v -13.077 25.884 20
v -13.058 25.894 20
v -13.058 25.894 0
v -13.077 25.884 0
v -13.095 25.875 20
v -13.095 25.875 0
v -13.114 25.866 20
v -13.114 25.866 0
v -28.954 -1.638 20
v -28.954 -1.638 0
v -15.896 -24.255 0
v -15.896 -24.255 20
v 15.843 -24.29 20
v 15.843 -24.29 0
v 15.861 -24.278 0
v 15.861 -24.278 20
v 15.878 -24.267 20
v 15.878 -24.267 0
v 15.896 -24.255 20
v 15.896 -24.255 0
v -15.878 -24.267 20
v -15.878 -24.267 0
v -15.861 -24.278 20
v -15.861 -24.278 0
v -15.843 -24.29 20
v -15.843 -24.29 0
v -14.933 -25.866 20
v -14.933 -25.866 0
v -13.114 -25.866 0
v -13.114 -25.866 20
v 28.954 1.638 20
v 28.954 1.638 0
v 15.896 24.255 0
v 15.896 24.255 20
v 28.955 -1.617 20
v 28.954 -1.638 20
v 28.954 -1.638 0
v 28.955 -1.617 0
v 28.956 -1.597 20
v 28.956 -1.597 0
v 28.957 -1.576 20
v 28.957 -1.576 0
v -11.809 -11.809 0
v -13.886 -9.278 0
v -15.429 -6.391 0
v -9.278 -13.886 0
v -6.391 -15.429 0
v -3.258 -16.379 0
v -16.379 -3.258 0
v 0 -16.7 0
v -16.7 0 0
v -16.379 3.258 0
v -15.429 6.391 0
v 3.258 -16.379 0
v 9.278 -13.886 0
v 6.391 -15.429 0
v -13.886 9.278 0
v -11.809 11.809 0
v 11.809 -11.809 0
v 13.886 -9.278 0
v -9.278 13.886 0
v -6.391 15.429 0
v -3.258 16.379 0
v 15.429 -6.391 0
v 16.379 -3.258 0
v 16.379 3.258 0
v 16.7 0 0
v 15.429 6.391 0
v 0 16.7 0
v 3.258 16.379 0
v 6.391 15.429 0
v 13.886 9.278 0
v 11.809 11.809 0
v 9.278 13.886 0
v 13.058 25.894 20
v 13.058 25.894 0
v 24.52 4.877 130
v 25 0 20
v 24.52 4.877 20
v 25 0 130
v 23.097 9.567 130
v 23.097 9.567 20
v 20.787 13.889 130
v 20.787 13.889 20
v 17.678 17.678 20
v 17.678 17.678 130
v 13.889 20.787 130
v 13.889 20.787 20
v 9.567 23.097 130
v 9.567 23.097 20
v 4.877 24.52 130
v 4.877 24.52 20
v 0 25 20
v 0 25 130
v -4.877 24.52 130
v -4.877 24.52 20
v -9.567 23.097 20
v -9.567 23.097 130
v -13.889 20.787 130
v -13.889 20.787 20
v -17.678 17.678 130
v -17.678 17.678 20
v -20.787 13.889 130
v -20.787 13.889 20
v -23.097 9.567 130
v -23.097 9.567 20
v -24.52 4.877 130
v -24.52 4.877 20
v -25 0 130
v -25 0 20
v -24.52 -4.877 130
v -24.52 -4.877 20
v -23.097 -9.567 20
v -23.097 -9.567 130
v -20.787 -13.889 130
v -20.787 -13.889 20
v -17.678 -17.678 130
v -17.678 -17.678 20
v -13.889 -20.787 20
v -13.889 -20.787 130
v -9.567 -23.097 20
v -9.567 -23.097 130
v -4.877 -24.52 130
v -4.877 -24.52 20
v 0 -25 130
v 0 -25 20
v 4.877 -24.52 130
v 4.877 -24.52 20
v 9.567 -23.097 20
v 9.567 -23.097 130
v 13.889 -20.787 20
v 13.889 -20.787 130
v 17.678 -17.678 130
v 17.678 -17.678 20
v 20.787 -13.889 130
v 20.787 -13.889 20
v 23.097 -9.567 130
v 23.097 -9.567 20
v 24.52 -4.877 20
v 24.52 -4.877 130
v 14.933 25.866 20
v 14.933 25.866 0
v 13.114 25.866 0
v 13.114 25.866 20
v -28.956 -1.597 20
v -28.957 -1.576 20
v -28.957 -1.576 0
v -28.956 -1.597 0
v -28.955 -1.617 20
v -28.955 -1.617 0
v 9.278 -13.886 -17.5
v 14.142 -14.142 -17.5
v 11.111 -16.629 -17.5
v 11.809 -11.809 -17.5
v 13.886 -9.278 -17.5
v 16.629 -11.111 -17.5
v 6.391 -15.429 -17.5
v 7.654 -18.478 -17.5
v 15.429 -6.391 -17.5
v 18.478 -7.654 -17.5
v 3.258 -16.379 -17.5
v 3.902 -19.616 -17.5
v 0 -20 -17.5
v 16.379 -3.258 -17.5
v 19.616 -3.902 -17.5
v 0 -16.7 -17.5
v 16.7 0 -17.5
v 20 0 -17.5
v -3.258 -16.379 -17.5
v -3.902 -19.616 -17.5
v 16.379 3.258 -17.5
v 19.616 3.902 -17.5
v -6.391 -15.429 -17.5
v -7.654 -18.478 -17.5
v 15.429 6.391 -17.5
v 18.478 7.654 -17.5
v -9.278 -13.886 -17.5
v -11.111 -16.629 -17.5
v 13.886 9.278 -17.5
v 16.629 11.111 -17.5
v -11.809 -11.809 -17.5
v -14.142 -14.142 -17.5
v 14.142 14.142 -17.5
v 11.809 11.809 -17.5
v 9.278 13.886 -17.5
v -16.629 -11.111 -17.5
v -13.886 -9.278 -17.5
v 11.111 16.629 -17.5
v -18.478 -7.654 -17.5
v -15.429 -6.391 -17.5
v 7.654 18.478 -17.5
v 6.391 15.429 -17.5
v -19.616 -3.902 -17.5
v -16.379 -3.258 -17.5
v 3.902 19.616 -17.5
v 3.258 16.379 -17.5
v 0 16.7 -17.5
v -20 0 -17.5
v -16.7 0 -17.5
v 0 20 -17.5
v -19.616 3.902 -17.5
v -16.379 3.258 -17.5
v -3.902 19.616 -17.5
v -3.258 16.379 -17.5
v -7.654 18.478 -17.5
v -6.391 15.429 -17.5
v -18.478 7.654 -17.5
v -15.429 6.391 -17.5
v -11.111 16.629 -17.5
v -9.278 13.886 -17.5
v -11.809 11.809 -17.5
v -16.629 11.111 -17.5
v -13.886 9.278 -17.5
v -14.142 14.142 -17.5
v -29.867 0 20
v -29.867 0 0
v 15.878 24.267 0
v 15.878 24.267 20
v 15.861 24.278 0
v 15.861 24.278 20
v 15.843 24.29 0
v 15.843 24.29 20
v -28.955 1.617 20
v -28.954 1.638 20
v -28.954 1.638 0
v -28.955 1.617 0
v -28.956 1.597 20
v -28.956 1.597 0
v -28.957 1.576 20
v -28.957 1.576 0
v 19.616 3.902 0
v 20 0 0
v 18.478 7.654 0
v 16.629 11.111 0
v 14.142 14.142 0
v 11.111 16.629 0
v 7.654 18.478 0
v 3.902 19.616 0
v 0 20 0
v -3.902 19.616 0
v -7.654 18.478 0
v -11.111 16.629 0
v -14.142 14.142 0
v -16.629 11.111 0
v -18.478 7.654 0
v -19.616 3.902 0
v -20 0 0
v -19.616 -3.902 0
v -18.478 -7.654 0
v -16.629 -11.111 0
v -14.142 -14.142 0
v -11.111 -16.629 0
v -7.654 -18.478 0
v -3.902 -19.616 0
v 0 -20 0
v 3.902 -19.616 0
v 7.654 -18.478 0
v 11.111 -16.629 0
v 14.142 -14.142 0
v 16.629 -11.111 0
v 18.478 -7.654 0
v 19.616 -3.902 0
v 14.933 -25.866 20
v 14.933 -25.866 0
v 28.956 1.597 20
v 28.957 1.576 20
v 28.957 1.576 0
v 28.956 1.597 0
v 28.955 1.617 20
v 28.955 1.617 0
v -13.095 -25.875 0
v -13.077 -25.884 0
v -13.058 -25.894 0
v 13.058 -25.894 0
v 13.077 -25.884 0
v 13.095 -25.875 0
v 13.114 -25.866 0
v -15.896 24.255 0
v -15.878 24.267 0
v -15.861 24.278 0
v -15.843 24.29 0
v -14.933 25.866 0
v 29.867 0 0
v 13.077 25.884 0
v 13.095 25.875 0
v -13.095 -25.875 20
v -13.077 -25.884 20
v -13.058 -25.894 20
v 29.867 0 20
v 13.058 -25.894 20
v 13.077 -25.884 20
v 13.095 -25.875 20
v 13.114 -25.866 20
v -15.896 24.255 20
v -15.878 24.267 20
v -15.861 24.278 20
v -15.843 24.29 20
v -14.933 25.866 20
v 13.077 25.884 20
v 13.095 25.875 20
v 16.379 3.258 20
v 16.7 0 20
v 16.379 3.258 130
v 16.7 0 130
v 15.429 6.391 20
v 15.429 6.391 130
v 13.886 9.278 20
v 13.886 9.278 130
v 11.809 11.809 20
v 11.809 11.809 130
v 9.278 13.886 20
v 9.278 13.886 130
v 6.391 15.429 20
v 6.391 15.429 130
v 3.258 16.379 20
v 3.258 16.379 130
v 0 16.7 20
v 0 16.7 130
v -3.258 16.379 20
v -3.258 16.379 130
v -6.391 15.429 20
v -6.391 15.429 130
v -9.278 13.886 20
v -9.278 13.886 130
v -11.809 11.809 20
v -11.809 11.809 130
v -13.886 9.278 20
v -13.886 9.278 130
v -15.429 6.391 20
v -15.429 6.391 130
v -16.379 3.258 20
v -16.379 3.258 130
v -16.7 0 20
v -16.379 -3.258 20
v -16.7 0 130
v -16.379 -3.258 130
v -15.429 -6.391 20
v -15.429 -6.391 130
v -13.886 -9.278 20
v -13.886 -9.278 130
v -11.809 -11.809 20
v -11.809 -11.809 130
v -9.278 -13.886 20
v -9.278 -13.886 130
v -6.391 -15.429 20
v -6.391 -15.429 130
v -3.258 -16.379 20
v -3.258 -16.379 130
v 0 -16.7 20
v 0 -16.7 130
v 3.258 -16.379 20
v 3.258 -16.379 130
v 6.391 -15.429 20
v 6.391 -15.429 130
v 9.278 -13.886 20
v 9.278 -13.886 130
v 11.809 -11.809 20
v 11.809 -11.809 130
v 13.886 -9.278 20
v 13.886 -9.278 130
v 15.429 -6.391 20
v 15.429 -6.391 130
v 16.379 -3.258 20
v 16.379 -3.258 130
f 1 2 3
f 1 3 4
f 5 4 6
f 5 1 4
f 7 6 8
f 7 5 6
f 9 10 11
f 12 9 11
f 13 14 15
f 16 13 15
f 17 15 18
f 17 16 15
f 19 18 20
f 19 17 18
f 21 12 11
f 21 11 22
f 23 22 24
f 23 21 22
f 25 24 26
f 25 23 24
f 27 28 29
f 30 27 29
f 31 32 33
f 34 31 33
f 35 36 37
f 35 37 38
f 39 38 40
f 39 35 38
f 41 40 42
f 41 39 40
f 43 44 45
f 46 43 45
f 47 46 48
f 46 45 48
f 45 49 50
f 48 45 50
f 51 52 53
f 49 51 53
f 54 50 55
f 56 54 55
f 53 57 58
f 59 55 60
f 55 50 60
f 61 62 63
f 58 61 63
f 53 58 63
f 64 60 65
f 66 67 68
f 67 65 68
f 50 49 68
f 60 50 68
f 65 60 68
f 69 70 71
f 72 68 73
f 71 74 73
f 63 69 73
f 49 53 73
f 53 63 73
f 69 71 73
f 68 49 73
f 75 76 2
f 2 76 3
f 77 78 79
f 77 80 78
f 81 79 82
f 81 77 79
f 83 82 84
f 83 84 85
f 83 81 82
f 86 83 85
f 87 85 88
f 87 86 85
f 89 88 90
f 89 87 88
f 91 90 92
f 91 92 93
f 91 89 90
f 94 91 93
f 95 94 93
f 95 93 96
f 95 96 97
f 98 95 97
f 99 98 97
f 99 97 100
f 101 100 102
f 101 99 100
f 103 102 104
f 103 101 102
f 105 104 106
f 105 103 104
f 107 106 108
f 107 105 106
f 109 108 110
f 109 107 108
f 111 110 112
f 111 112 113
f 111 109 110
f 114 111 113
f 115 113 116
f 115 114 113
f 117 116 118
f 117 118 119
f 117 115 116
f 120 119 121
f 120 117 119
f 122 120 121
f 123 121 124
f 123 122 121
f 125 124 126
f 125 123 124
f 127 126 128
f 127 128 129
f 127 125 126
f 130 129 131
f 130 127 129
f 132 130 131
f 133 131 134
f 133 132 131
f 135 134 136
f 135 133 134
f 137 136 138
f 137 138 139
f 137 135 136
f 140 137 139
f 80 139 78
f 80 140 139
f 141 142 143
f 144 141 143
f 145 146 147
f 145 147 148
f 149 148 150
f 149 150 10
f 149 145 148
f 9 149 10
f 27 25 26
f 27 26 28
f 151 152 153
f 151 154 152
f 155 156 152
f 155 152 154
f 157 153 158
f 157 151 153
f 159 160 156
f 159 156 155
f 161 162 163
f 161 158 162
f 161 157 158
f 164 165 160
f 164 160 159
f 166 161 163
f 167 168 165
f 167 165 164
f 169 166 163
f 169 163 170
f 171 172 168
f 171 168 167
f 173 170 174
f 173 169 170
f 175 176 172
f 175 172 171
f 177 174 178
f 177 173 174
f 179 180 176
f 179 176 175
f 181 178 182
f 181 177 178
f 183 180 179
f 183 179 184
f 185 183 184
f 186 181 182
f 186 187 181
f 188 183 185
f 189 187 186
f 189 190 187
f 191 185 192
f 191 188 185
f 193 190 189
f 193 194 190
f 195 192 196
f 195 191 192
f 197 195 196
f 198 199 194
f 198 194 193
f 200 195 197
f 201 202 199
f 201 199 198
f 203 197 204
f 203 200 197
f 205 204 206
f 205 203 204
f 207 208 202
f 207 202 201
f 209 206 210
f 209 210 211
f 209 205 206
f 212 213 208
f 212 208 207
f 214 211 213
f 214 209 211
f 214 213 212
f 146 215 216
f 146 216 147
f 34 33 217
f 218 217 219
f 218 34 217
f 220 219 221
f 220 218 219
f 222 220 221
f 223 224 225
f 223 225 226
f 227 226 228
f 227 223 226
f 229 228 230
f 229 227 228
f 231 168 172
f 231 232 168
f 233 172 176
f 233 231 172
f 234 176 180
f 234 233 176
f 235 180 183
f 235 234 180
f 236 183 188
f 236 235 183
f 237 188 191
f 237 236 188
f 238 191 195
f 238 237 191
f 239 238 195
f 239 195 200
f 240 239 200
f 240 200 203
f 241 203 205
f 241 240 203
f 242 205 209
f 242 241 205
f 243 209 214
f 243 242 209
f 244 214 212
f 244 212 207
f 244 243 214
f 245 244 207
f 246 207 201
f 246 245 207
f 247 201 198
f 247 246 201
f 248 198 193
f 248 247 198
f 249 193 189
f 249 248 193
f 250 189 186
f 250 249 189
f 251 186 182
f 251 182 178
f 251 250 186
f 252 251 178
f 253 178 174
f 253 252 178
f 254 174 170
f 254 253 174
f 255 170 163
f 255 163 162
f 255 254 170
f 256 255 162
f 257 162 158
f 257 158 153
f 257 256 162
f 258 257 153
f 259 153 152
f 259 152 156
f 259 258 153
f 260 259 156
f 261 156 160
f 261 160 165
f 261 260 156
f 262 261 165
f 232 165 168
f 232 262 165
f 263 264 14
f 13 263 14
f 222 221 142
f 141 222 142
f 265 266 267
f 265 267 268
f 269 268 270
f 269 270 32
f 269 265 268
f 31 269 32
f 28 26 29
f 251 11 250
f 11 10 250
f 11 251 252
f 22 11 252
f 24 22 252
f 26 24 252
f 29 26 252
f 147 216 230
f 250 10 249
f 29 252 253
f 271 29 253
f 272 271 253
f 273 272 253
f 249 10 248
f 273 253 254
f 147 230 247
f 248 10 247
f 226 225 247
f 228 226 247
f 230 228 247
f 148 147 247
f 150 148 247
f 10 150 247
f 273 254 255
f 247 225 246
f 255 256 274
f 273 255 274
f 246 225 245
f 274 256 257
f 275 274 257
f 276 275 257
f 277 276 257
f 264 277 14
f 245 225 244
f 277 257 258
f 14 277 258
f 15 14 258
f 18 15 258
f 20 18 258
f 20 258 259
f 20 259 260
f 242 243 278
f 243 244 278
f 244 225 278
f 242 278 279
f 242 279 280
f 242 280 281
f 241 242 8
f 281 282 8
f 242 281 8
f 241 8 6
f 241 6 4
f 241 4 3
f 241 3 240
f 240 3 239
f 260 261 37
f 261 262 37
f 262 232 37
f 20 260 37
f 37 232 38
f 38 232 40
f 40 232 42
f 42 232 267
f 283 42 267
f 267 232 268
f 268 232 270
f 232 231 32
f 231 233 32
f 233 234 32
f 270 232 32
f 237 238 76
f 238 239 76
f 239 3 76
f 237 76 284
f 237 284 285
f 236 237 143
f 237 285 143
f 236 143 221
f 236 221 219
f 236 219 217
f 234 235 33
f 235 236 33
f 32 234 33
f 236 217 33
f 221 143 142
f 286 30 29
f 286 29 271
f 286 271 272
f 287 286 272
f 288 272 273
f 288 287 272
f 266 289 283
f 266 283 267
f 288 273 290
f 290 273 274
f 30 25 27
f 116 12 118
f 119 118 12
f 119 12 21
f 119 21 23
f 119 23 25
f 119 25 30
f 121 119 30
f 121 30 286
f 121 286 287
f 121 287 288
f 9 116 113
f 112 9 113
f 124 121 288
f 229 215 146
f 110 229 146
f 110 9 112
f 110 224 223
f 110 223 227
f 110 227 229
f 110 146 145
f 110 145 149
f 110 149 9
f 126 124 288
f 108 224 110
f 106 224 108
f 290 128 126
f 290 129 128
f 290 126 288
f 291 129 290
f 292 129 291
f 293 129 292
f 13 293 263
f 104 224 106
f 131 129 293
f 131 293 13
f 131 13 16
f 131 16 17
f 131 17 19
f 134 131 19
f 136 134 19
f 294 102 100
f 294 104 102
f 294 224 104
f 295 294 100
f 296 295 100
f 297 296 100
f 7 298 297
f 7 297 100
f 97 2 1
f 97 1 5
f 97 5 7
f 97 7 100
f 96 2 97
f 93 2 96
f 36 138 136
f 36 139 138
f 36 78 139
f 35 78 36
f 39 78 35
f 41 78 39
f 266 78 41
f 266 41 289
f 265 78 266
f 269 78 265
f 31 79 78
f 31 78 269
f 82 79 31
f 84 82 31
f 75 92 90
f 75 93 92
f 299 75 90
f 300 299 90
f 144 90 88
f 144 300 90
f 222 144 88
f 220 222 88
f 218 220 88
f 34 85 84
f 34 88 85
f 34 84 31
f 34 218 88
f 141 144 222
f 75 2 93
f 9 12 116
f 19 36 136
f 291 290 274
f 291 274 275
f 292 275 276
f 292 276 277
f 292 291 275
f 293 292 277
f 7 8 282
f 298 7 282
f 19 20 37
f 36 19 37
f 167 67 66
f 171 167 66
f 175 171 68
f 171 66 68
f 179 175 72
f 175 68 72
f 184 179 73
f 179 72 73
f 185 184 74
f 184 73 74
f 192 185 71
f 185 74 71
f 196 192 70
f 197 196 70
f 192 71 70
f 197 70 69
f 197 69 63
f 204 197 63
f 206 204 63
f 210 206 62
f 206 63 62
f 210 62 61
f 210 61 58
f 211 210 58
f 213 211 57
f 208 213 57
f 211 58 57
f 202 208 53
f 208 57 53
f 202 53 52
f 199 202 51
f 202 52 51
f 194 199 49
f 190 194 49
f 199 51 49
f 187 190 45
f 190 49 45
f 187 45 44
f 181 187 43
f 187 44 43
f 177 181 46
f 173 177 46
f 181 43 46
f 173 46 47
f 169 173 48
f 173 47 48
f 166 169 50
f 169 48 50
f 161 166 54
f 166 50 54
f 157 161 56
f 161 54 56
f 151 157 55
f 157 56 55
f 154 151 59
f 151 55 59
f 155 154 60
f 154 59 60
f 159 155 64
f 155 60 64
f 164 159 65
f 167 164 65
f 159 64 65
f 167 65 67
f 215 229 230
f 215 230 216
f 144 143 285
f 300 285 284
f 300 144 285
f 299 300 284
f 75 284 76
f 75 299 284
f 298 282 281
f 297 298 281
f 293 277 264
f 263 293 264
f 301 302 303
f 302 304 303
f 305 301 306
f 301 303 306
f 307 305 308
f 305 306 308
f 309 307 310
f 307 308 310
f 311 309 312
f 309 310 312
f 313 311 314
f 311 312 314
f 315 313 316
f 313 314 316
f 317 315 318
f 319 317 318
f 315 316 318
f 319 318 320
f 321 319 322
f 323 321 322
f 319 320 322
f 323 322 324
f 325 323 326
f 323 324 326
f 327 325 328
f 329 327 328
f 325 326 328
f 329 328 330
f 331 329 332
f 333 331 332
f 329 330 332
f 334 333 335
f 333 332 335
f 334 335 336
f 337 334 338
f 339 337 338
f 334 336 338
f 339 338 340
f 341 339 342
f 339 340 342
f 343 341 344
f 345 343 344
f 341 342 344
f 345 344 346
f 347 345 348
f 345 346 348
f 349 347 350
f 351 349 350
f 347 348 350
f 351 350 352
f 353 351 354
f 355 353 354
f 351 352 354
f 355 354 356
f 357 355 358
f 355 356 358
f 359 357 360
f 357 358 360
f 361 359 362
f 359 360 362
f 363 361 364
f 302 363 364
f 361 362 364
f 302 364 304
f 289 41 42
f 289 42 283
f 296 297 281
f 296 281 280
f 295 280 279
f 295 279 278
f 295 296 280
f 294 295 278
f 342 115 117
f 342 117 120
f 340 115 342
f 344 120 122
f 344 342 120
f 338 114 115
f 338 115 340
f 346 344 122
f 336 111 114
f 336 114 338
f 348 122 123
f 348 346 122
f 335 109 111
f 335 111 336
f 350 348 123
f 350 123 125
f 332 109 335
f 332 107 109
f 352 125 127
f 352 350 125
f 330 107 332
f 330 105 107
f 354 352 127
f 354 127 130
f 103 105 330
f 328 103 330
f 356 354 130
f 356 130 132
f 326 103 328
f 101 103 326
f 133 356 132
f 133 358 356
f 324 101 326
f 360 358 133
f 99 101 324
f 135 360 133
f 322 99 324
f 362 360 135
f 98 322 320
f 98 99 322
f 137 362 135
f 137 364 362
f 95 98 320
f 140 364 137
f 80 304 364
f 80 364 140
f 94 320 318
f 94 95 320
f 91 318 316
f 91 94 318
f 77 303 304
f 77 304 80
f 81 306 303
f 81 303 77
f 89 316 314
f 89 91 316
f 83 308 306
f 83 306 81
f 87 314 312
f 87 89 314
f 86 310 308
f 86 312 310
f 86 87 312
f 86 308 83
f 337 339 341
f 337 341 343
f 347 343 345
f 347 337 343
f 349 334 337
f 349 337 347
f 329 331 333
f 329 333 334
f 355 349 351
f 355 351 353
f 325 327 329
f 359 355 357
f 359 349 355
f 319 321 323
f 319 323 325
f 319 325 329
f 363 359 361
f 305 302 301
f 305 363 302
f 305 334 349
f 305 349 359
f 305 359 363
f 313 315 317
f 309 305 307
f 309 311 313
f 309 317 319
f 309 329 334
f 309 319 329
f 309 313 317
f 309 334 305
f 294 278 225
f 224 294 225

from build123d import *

# Parameters (mm, degrees)
SALIENTE_EXTRUIR1_DEPTH = 20
CROQUIS4_OUTSIDE_W      = 95.61
CROQUIS4_OUTSIDE_H      = 93.876
CORTAR_EXTRUIR3_DEPTH   = 20


with BuildPart() as part:
    # Croquis1 → Revolución1 (revolve)
    with BuildSketch(Plane(origin=(0, 0, 0), x_dir=(1, 0, 0), z_dir=(0, 1, 0))):
        Polygon((16.7, -87.44), (16.7, 17.5), (20, 17.5), (20, 0), (29, 0), (29, -20), (25, -20), (25, -130), (16.7, -130), align=None)
    revolve(axis=Axis((0, 0, -40.16), (0, 0, 1)))

    # Croquis3 → Saliente-Extruir1 (add)
    with BuildSketch(Plane.XY):
        Polygon((29.866932707, 0), (14.933466354, 25.865522458), (-14.933466354, 25.865522458), (-29.866932707, 0), (-14.933466354, -25.865522458), (14.933466354, -25.865522458), align=None)
    extrude(amount=SALIENTE_EXTRUIR1_DEPTH)

    # Croquis4 outside → Cortar-Extruir3 (cut)
    with BuildSketch(Plane.XY):
        Rectangle(CROQUIS4_OUTSIDE_W, CROQUIS4_OUTSIDE_H)
        Polygon((29.899549638, 0), (14.949774819, 25.893769548), (-14.949774819, 25.893769548), (-29.899549638, 0), (-14.949774819, -25.893769548), (14.949774819, -25.893769548), align=None, mode=Mode.SUBTRACT)
    extrude(amount=CORTAR_EXTRUIR3_DEPTH, mode=Mode.SUBTRACT)


solid = part.part
